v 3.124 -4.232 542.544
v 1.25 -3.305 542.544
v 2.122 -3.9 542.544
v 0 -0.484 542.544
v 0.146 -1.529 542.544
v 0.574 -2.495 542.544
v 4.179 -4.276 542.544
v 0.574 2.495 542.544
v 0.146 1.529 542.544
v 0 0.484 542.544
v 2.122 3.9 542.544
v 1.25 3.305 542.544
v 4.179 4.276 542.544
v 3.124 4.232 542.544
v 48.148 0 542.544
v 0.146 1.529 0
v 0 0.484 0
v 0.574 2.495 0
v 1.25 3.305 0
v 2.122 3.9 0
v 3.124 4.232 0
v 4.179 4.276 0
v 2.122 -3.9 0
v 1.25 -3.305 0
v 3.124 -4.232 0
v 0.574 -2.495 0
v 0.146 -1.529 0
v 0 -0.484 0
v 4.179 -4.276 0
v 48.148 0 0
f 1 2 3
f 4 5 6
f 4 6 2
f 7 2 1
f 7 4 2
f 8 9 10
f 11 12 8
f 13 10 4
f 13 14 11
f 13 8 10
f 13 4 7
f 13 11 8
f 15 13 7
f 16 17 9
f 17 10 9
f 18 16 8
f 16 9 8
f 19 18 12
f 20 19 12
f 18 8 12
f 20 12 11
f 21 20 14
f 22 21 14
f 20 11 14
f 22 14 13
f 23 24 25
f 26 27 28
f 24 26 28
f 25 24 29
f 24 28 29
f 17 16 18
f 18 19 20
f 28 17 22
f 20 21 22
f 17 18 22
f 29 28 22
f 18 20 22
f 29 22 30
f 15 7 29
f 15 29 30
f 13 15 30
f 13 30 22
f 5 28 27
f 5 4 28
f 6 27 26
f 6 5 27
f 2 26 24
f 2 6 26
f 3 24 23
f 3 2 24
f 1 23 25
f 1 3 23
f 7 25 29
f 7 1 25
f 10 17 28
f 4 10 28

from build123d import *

# Parameters (mm, degrees)
BOSS_EXTRUDE1_DEPTH = 542.544
FILLET1_R           = 3.81


with BuildPart() as part:
    # Sketch1 → Boss-Extrude1 (new body)
    with BuildSketch(Plane.XY):
        Polygon((0, 4.68249), (0, -4.68249), (48.14824, 0), align=None)
    extrude(amount=BOSS_EXTRUDE1_DEPTH)

    # Fillet1
    fillet1_edges = [part.edges().sort_by_distance(p)[0] for p in [
        (0, -4.68249, 271.272),
        (0, 4.68249, 271.272),
    ]]
    fillet(fillet1_edges, radius=FILLET1_R)


solid = part.part
